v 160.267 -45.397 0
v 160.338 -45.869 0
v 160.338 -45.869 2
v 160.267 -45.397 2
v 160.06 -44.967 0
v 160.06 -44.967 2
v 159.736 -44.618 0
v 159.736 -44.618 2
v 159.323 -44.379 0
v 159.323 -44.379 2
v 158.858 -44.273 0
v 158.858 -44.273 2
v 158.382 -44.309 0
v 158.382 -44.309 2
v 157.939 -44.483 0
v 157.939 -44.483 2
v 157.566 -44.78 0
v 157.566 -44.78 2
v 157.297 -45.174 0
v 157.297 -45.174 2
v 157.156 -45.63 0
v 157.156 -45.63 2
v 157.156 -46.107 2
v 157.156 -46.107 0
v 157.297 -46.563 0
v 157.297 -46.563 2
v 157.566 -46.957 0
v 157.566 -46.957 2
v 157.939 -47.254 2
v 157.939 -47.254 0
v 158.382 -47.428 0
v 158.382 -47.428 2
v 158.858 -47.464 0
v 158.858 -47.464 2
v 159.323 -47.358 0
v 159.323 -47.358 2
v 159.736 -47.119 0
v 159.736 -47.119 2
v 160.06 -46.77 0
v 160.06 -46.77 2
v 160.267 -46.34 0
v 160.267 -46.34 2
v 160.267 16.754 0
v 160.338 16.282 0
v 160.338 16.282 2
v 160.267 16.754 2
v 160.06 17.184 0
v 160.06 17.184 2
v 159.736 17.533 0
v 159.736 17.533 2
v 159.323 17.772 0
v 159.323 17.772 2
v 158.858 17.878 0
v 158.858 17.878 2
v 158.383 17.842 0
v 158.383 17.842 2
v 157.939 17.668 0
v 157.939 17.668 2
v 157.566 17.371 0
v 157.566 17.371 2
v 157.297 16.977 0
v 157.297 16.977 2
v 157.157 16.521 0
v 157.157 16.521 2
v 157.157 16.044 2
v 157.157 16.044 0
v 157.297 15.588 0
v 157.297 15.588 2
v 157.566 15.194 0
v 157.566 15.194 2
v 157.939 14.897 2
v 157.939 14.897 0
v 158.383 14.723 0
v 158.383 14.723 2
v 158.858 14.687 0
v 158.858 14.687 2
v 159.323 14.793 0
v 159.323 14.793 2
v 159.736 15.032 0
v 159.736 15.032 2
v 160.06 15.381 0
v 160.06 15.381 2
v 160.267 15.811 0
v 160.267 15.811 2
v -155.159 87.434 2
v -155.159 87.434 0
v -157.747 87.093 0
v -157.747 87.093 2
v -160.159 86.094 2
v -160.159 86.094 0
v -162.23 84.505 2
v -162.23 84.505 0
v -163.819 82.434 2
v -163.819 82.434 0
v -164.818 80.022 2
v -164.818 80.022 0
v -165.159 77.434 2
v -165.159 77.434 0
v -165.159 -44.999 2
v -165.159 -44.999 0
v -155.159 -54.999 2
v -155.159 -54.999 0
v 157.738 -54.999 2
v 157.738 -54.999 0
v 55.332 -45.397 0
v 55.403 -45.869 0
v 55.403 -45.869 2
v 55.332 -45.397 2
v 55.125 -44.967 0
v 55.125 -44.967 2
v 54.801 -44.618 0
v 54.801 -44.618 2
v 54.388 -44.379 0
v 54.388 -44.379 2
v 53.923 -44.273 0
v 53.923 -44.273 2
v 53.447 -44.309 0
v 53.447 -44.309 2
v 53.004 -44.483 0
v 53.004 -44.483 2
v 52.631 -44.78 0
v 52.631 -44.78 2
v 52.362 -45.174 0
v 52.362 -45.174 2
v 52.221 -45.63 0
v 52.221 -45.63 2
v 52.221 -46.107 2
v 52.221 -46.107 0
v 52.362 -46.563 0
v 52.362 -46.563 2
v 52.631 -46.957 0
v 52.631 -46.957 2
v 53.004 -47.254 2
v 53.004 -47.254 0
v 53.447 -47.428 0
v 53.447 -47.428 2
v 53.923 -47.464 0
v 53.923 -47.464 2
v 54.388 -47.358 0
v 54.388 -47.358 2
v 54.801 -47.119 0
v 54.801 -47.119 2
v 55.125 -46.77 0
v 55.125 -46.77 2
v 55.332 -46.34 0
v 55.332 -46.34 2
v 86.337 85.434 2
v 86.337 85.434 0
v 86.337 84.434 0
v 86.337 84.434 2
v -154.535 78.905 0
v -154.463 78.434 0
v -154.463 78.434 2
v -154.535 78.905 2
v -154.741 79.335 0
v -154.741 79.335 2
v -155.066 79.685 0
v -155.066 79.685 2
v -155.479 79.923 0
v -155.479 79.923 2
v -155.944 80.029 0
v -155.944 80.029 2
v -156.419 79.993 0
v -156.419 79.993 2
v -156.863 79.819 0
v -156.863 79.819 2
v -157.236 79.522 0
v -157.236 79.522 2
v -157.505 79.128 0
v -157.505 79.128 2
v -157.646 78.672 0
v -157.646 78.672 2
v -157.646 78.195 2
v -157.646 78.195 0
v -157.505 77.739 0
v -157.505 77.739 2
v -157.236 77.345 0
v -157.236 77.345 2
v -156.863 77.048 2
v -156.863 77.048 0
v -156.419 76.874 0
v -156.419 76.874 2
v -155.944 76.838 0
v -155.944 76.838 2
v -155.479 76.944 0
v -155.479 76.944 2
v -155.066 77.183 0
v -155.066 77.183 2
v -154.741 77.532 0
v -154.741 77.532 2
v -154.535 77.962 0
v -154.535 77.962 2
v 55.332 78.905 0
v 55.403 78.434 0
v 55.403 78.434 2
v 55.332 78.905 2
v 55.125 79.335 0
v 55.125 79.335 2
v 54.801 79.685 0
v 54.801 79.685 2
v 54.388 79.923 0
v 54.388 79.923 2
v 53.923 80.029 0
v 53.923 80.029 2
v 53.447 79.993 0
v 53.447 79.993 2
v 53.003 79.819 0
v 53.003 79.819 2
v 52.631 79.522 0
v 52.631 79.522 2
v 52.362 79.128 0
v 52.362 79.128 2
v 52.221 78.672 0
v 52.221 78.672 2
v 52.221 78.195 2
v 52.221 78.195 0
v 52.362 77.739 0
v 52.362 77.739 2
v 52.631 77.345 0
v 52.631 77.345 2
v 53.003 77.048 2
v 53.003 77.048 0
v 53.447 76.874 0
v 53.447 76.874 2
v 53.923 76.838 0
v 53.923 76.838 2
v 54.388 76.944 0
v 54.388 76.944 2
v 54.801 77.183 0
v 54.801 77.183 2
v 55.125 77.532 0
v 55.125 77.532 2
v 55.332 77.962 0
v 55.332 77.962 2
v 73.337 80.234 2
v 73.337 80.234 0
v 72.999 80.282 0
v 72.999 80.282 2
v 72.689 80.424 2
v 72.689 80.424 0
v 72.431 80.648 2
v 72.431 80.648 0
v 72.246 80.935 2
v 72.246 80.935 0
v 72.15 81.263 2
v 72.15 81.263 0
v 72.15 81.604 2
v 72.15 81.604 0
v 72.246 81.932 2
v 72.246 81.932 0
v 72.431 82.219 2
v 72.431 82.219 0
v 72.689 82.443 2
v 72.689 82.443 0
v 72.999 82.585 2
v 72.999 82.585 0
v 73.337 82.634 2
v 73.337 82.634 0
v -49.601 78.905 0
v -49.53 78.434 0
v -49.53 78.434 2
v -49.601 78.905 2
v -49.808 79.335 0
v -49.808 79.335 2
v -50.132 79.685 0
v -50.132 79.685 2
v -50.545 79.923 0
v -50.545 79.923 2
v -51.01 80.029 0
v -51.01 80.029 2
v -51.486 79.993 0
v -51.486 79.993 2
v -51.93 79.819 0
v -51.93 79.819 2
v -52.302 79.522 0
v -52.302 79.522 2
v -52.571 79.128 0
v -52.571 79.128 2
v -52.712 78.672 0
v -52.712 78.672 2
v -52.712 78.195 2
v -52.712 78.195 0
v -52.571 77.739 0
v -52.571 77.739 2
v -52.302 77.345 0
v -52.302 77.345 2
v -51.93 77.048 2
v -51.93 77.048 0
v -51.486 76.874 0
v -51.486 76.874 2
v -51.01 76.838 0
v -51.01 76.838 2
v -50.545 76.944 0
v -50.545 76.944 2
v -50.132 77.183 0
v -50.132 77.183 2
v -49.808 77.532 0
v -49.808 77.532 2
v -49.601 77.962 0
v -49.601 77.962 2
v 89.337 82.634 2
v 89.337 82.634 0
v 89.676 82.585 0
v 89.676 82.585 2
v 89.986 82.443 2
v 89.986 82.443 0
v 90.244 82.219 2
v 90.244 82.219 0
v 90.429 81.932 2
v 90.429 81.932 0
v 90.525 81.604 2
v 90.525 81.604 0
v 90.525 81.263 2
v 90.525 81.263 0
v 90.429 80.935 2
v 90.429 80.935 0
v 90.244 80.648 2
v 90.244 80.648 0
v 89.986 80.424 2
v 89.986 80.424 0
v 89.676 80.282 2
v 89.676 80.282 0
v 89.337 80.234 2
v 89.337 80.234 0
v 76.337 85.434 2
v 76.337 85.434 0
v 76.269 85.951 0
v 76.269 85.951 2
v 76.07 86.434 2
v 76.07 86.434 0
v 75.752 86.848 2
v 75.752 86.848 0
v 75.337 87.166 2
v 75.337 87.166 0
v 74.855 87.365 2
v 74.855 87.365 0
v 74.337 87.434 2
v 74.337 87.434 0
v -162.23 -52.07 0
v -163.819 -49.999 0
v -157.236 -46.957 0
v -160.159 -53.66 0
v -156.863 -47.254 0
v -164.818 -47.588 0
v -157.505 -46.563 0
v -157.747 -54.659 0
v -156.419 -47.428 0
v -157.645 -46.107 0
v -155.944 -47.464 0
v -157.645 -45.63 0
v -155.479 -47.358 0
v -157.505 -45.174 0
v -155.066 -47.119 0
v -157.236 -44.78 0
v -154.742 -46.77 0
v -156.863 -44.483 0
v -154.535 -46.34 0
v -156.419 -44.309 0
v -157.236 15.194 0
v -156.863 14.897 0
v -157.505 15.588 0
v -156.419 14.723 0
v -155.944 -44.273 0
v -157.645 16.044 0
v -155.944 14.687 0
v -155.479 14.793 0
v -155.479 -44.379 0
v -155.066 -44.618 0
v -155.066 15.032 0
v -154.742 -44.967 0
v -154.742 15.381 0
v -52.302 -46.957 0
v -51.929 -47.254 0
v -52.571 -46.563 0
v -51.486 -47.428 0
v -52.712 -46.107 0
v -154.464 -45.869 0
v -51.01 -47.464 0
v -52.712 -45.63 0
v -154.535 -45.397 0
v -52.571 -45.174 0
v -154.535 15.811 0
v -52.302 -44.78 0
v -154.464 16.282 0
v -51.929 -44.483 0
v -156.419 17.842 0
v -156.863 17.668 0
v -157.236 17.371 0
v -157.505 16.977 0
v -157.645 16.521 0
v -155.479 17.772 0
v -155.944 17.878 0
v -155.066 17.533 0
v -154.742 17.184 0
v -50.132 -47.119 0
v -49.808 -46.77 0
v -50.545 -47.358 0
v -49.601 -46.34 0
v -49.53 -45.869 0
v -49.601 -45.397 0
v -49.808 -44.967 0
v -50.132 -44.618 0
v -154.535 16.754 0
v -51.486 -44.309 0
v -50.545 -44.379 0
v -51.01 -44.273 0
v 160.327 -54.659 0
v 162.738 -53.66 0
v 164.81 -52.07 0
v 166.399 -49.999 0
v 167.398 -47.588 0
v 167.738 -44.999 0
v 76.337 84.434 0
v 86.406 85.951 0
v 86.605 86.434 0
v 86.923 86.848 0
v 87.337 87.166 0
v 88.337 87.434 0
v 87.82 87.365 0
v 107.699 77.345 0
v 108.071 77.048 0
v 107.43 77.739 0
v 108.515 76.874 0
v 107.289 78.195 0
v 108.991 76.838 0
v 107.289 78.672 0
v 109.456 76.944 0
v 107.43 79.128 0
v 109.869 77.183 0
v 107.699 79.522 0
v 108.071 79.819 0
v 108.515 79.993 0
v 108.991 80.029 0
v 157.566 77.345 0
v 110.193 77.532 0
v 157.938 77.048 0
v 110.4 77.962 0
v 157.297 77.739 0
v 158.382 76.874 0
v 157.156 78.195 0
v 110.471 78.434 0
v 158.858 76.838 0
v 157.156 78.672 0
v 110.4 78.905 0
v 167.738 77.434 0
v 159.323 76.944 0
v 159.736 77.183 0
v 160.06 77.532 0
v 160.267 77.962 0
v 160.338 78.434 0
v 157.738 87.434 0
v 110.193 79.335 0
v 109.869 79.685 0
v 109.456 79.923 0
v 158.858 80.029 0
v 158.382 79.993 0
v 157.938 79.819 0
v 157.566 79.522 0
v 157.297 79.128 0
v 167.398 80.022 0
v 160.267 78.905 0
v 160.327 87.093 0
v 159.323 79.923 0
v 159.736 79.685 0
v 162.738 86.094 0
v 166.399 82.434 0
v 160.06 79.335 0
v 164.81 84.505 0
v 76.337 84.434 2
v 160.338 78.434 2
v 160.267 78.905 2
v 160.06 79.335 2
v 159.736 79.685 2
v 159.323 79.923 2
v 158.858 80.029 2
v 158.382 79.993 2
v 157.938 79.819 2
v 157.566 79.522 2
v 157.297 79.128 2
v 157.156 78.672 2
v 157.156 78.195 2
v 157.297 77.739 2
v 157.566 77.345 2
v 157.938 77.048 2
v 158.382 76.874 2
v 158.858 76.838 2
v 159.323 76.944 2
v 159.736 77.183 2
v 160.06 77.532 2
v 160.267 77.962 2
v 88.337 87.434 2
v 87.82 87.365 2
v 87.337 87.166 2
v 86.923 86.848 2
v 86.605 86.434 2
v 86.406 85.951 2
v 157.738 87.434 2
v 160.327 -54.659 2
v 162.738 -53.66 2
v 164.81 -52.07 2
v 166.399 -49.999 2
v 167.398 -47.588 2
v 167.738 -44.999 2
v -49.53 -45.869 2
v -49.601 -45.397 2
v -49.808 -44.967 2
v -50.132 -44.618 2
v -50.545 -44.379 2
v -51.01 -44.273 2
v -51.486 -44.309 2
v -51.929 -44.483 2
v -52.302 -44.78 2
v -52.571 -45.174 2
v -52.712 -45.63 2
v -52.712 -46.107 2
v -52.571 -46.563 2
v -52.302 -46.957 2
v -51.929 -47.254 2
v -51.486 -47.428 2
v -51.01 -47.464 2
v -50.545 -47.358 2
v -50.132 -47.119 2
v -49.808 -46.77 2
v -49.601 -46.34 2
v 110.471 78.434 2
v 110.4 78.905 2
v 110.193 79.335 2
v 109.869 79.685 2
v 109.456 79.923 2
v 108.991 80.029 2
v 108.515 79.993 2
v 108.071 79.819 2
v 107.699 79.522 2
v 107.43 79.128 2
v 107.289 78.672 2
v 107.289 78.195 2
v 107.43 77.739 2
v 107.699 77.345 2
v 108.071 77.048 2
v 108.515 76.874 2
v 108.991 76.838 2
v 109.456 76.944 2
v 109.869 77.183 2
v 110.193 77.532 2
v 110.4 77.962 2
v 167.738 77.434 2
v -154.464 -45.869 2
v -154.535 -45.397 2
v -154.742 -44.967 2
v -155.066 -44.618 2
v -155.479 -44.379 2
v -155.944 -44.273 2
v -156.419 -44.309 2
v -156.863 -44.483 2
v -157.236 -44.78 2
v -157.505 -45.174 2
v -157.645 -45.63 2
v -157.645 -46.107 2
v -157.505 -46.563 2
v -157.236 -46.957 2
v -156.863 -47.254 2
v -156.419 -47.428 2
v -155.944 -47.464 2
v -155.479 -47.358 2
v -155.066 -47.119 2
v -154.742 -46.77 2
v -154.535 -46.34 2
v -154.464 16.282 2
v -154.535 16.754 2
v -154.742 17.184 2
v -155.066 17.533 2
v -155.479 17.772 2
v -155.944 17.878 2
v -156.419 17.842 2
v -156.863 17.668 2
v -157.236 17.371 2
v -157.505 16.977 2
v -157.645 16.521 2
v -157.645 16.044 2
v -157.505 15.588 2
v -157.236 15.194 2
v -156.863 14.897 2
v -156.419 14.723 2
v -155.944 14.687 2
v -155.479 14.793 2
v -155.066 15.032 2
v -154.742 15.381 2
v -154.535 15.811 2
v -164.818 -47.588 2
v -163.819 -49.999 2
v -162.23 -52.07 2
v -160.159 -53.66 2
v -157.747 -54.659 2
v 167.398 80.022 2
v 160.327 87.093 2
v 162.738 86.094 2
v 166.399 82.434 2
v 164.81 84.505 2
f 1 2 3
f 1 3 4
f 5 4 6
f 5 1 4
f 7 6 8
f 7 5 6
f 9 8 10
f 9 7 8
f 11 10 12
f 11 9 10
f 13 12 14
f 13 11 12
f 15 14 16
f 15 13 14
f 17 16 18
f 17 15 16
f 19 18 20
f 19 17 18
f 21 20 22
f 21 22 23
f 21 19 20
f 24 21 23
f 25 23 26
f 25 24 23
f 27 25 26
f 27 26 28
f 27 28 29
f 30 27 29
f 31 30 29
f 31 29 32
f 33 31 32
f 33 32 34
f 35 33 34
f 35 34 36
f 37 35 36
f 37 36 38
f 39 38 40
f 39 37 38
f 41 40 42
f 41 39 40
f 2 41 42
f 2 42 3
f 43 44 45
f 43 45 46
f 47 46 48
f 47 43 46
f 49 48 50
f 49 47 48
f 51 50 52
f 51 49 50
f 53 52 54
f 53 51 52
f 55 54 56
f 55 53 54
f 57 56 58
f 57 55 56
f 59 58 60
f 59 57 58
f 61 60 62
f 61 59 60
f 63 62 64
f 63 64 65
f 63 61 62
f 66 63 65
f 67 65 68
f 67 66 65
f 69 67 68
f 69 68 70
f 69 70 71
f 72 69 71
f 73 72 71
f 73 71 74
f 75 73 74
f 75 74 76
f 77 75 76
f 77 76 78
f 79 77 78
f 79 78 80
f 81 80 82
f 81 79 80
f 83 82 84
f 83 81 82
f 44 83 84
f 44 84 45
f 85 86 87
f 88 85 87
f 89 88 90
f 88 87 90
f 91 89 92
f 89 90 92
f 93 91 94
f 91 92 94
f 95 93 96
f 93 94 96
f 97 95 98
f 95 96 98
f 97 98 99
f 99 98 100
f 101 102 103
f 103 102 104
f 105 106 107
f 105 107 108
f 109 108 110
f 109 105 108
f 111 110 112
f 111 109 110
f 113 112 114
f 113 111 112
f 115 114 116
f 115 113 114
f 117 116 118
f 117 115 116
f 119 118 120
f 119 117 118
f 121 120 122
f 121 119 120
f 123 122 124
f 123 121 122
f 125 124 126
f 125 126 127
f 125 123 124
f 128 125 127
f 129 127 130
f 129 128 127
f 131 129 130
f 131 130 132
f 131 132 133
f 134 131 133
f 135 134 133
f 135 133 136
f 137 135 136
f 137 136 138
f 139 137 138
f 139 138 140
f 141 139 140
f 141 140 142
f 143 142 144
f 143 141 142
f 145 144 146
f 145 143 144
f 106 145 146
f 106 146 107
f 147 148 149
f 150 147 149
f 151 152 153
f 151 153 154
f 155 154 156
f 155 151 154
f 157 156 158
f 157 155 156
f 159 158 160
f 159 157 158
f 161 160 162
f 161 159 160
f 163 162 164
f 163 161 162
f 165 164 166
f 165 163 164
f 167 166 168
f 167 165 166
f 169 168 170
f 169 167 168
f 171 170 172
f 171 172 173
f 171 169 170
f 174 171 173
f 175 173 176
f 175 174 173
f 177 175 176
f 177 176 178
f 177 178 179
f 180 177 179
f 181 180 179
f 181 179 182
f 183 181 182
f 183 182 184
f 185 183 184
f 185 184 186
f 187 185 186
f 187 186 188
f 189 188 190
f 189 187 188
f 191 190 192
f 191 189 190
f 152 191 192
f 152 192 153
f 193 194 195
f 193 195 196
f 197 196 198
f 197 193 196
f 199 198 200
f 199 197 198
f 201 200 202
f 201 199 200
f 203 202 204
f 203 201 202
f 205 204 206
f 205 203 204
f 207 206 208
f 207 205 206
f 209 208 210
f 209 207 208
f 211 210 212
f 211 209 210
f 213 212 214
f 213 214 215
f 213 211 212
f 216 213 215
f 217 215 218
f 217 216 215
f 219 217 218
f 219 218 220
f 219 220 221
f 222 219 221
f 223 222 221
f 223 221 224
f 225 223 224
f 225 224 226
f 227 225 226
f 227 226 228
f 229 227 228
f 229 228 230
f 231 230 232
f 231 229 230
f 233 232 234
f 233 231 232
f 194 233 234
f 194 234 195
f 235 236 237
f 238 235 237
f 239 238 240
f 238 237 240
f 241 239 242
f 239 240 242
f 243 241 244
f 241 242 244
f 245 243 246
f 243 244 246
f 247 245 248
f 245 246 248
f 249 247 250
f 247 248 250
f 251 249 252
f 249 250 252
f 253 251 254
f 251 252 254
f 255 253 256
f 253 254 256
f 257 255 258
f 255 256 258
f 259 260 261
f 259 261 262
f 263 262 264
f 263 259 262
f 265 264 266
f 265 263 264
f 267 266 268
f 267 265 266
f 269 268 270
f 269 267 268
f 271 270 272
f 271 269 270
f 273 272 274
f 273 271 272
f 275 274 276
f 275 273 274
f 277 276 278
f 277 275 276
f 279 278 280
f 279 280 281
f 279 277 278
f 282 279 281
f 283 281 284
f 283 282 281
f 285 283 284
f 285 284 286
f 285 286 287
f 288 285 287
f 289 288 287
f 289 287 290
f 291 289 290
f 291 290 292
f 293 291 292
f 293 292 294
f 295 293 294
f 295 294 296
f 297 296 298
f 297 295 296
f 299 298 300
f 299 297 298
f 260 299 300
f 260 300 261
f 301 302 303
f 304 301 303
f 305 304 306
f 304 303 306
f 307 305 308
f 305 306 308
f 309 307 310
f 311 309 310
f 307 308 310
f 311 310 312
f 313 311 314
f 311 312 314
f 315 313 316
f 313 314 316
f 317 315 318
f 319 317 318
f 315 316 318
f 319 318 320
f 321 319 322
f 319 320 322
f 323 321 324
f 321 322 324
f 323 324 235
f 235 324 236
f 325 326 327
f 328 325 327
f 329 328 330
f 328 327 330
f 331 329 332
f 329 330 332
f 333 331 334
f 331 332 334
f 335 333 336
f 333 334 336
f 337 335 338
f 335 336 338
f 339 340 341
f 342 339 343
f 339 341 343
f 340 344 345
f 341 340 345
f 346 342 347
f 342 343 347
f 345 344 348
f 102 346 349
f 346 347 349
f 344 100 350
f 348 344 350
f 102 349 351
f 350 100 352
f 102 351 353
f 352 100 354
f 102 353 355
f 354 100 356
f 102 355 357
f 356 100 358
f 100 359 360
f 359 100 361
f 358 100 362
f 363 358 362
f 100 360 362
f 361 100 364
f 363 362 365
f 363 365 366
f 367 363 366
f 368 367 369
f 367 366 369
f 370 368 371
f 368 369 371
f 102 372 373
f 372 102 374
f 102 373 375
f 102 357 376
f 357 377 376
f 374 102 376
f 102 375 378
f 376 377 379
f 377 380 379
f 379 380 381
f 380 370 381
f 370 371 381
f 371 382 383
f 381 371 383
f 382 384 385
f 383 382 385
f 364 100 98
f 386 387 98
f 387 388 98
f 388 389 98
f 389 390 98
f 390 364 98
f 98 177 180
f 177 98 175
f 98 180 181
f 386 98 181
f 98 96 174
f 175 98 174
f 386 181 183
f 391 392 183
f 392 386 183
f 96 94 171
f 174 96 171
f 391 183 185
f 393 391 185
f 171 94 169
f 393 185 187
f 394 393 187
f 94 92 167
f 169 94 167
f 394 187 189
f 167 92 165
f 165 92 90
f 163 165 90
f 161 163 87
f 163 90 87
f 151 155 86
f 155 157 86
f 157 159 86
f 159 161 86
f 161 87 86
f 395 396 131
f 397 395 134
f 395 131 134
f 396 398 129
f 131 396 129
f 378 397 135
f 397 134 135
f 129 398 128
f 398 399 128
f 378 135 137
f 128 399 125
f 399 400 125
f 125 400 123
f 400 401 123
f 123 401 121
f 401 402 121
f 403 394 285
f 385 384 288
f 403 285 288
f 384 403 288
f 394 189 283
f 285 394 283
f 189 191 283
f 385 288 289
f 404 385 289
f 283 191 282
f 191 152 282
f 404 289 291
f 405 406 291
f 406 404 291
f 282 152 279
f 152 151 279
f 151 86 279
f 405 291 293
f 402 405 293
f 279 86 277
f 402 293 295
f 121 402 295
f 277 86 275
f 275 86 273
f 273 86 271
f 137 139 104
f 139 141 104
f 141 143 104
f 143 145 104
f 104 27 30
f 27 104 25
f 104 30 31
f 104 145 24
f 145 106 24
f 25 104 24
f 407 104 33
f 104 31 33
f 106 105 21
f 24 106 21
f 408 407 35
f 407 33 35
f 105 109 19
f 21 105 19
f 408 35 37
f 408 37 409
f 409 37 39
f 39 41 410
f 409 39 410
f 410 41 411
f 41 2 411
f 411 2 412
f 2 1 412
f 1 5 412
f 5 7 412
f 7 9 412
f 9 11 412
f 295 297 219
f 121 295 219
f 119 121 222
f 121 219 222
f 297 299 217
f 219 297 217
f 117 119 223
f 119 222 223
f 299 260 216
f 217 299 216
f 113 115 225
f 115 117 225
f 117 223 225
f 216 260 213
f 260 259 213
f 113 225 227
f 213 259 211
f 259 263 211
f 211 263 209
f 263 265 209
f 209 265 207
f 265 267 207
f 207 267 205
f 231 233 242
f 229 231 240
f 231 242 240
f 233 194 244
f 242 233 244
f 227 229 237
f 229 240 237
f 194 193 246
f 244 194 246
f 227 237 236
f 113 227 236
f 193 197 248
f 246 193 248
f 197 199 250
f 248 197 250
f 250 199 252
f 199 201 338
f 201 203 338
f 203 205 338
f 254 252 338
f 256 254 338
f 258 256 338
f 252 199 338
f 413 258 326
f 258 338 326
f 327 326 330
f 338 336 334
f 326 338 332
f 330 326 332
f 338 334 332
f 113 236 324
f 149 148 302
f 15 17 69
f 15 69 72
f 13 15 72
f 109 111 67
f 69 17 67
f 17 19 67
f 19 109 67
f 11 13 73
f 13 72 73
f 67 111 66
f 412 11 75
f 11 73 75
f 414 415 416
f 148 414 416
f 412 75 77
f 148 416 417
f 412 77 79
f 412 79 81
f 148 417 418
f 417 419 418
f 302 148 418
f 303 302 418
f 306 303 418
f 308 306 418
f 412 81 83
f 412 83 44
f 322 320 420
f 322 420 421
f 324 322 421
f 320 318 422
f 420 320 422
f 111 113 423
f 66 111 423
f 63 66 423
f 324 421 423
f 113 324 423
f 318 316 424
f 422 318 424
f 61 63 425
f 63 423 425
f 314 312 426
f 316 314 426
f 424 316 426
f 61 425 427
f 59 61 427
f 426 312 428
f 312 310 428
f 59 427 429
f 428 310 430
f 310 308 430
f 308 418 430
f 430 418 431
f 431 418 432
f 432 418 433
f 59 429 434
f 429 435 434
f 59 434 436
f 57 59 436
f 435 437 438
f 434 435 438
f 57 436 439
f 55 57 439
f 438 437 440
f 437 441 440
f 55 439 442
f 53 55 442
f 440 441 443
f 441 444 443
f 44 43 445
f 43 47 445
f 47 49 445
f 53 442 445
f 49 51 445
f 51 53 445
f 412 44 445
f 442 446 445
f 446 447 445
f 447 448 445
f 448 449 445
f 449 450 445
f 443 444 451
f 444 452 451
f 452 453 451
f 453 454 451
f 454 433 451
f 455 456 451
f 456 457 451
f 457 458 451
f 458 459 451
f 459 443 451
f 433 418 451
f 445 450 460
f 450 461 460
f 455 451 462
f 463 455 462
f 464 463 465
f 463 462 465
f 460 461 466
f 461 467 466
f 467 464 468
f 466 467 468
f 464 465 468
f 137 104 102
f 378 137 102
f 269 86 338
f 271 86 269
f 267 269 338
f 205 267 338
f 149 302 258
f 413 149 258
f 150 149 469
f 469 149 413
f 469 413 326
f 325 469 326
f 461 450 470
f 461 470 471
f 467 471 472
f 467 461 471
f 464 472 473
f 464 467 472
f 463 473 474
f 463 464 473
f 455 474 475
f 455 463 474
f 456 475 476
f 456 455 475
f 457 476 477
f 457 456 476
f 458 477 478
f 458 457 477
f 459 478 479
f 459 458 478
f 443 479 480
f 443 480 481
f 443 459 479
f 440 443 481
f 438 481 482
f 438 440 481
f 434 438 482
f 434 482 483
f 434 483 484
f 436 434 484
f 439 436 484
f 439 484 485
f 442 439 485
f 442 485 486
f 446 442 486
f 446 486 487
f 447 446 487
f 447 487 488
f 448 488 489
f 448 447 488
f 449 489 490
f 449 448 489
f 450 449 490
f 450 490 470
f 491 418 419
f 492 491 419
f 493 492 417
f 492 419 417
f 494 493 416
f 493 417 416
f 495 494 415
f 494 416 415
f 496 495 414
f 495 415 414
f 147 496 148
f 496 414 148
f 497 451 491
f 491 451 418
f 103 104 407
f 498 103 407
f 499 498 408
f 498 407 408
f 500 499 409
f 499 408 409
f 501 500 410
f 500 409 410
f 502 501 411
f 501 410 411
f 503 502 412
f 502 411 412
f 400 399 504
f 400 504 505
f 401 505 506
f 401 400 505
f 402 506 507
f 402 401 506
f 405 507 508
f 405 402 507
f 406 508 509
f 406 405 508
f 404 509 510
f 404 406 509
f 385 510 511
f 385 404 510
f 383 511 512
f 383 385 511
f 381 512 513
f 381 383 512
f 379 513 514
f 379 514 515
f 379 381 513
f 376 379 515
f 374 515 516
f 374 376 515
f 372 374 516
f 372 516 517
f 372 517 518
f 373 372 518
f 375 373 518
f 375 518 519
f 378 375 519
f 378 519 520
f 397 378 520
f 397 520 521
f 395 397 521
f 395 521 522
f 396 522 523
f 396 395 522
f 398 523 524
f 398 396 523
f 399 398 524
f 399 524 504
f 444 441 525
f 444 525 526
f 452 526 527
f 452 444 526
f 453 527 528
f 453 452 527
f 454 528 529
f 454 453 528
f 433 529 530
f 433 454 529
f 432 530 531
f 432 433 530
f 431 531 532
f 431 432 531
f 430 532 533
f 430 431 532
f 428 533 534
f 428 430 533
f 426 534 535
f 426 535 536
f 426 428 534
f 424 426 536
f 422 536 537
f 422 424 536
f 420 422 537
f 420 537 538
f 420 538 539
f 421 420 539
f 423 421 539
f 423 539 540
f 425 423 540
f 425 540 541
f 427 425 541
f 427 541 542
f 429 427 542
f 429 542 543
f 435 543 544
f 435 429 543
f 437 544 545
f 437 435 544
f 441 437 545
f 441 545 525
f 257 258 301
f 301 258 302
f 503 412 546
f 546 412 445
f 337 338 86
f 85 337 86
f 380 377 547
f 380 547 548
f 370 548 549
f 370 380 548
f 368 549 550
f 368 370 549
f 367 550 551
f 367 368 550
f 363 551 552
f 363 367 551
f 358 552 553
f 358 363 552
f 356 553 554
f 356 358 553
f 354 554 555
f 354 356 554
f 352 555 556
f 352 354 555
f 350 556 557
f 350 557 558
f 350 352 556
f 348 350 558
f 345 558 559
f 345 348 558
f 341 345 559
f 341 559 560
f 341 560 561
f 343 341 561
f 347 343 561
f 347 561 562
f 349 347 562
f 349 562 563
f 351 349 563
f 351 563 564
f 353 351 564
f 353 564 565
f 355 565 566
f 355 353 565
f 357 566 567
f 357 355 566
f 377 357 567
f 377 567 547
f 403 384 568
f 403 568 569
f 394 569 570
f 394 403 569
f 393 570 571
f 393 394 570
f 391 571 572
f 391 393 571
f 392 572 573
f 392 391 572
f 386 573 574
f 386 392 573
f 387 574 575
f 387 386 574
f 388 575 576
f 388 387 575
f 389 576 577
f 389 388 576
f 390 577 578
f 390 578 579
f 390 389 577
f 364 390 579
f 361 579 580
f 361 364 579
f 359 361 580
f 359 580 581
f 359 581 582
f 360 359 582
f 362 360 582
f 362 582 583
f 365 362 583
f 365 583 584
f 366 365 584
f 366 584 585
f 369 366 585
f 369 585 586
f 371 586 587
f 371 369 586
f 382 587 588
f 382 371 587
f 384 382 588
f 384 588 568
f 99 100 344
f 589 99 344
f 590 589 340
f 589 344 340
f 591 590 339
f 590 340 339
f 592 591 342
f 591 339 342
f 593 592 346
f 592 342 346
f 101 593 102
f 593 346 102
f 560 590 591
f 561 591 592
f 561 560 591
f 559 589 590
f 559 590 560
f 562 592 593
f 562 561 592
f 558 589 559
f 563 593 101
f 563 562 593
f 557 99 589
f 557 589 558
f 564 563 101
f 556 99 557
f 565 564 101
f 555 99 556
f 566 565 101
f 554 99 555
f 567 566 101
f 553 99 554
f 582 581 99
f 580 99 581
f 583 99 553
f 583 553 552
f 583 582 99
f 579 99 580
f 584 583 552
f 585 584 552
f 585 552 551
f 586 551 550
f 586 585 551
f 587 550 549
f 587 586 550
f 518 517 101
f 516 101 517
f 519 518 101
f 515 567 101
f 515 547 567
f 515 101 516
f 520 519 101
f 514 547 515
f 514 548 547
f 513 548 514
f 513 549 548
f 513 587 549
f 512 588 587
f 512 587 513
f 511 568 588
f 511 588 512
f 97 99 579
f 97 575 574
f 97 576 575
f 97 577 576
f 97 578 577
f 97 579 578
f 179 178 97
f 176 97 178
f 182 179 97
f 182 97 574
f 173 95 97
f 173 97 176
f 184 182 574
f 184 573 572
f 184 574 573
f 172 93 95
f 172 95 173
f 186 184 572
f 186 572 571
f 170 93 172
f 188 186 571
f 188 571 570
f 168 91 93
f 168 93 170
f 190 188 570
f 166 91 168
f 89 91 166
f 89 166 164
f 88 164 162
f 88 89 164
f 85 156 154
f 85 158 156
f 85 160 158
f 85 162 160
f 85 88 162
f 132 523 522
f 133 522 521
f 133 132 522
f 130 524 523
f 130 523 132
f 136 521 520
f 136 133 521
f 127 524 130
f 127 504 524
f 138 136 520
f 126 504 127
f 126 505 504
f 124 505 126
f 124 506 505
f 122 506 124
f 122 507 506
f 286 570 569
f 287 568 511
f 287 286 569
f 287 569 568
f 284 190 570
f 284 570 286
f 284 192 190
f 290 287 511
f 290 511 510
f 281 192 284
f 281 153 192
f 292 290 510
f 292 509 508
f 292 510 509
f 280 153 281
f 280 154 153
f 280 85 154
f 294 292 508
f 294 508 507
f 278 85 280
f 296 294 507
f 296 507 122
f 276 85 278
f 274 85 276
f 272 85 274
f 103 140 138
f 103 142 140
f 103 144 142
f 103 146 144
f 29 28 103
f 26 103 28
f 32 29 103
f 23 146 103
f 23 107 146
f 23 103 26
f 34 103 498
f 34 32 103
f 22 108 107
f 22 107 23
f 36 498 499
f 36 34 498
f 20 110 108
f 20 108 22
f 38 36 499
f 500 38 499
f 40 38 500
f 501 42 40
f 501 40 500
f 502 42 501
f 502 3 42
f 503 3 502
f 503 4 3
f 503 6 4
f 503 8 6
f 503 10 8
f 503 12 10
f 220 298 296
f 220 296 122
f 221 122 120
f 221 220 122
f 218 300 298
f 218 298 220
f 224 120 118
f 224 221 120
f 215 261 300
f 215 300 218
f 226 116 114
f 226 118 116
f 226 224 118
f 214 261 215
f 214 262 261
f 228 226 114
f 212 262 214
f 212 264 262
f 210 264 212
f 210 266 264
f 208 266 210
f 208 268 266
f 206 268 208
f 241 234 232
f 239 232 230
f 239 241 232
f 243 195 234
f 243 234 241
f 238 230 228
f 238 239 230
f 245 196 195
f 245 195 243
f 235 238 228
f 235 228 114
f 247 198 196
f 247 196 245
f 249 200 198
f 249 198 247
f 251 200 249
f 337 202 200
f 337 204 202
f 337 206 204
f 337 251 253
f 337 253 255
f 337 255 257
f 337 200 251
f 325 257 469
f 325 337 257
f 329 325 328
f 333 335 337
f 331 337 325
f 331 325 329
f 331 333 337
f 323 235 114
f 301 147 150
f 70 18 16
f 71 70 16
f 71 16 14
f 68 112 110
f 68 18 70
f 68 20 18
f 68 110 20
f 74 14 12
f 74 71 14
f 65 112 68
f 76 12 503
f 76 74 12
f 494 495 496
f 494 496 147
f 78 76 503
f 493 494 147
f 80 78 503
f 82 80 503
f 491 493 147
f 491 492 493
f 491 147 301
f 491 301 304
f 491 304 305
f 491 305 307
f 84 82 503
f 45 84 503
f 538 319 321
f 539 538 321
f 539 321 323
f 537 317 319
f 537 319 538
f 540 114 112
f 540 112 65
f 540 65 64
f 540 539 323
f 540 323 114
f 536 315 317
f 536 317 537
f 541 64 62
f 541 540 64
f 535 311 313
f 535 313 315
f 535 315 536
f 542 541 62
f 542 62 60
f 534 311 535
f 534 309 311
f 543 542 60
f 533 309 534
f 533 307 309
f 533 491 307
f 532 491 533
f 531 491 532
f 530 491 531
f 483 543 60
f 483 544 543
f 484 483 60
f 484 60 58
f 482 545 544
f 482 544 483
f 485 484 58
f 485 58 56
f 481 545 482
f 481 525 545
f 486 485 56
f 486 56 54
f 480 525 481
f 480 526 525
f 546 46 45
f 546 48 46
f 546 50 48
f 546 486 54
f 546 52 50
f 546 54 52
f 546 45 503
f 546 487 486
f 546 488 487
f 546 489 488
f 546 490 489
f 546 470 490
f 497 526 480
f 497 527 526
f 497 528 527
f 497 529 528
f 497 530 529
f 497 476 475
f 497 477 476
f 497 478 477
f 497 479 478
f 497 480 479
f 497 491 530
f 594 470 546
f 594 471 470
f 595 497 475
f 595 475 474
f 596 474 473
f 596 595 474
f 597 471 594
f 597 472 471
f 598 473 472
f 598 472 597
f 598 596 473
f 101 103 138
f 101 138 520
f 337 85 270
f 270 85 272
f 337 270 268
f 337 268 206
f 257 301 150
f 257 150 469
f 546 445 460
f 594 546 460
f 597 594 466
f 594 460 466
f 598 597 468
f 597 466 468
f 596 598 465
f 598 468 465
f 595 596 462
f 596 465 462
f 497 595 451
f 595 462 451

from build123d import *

# Parameters (mm, degrees)
SKETCH_1_R      = 1.6
SKETCH_1_R_2    = 1.5998
SKETCH_1_R_3    = 1.59992
EXTRUDE_2_DEPTH = 2


with BuildPart() as part:
    # 草图1 → 凸台-拉伸2 (new body)
    with BuildSketch(Plane.XY):
        with BuildLine():
            Line((-165.158505018, 77.433579777), (-165.158505018, -44.999420223))
            ThreePointArc((-165.158505018, -44.999420223), (-162.22957283, -52.070488035), (-155.158505018, -54.999420223))
            Line((-155.158505018, -54.999420223), (157.738494982, -54.999420223))
            ThreePointArc((157.738494982, -54.999420223), (164.809562794, -52.070488035), (167.738494982, -44.999420223))
            Line((167.738494982, -44.999420223), (167.738494982, 77.433579777))
            ThreePointArc((167.738494982, 77.433579777), (164.809562794, 84.504647589), (157.738494982, 87.433579777))
            Line((157.738494982, 87.433579777), (88.337494982, 87.433579777))
            ThreePointArc((88.337494982, 87.433579777), (86.92328142, 86.847793339), (86.337494982, 85.433579777))
            Line((86.337494982, 85.433579777), (86.337494982, 84.433579777))
            Line((86.337494982, 84.433579777), (76.337494982, 84.433579777))
            Line((76.337494982, 84.433579777), (76.337494982, 85.433579777))
            ThreePointArc((76.337494982, 85.433579777), (75.751708545, 86.847793339), (74.337494982, 87.433579777))
            Line((74.337494982, 87.433579777), (-155.158505018, 87.433579777))
            ThreePointArc((-155.158505018, 87.433579777), (-162.22957283, 84.504647589), (-165.158505018, 77.433579777))
        make_face()
        with Locations((53.803494982, 78.433579777)):
            Circle(SKETCH_1_R, mode=Mode.SUBTRACT)
        with Locations((108.871494982, 78.433579777)):
            Circle(SKETCH_1_R, mode=Mode.SUBTRACT)
        with Locations((158.738494982, 78.433579777)):
            Circle(SKETCH_1_R, mode=Mode.SUBTRACT)
        with Locations((158.738494982, 16.282479777)):
            Circle(SKETCH_1_R_2, mode=Mode.SUBTRACT)
        with Locations((158.738494982, -45.868520223)):
            Circle(SKETCH_1_R_3, mode=Mode.SUBTRACT)
        with Locations((53.803494982, -45.868520223)):
            Circle(SKETCH_1_R_3, mode=Mode.SUBTRACT)
        with Locations((-51.129505018, -45.868520223)):
            Circle(SKETCH_1_R_3, mode=Mode.SUBTRACT)
        with Locations((-156.063435018, -45.868520223)):
            Circle(SKETCH_1_R_3, mode=Mode.SUBTRACT)
        with Locations((-156.063435018, 16.282479777)):
            Circle(SKETCH_1_R_2, mode=Mode.SUBTRACT)
        with Locations((-156.063435018, 78.433579777)):
            Circle(SKETCH_1_R, mode=Mode.SUBTRACT)
        with Locations((-51.129505018, 78.433579777)):
            Circle(SKETCH_1_R, mode=Mode.SUBTRACT)
        with BuildLine():
            Line((73.337494982, 82.633579777), (89.337494982, 82.633579777))
            ThreePointArc((89.337494982, 82.633579777), (90.537494982, 81.433579777), (89.337494982, 80.233579777))
            Line((89.337494982, 80.233579777), (73.337494982, 80.233579777))
            ThreePointArc((73.337494982, 80.233579777), (72.137494982, 81.433579777), (73.337494982, 82.633579777))
        make_face(mode=Mode.SUBTRACT)
    extrude(amount=EXTRUDE_2_DEPTH)


solid = part.part
